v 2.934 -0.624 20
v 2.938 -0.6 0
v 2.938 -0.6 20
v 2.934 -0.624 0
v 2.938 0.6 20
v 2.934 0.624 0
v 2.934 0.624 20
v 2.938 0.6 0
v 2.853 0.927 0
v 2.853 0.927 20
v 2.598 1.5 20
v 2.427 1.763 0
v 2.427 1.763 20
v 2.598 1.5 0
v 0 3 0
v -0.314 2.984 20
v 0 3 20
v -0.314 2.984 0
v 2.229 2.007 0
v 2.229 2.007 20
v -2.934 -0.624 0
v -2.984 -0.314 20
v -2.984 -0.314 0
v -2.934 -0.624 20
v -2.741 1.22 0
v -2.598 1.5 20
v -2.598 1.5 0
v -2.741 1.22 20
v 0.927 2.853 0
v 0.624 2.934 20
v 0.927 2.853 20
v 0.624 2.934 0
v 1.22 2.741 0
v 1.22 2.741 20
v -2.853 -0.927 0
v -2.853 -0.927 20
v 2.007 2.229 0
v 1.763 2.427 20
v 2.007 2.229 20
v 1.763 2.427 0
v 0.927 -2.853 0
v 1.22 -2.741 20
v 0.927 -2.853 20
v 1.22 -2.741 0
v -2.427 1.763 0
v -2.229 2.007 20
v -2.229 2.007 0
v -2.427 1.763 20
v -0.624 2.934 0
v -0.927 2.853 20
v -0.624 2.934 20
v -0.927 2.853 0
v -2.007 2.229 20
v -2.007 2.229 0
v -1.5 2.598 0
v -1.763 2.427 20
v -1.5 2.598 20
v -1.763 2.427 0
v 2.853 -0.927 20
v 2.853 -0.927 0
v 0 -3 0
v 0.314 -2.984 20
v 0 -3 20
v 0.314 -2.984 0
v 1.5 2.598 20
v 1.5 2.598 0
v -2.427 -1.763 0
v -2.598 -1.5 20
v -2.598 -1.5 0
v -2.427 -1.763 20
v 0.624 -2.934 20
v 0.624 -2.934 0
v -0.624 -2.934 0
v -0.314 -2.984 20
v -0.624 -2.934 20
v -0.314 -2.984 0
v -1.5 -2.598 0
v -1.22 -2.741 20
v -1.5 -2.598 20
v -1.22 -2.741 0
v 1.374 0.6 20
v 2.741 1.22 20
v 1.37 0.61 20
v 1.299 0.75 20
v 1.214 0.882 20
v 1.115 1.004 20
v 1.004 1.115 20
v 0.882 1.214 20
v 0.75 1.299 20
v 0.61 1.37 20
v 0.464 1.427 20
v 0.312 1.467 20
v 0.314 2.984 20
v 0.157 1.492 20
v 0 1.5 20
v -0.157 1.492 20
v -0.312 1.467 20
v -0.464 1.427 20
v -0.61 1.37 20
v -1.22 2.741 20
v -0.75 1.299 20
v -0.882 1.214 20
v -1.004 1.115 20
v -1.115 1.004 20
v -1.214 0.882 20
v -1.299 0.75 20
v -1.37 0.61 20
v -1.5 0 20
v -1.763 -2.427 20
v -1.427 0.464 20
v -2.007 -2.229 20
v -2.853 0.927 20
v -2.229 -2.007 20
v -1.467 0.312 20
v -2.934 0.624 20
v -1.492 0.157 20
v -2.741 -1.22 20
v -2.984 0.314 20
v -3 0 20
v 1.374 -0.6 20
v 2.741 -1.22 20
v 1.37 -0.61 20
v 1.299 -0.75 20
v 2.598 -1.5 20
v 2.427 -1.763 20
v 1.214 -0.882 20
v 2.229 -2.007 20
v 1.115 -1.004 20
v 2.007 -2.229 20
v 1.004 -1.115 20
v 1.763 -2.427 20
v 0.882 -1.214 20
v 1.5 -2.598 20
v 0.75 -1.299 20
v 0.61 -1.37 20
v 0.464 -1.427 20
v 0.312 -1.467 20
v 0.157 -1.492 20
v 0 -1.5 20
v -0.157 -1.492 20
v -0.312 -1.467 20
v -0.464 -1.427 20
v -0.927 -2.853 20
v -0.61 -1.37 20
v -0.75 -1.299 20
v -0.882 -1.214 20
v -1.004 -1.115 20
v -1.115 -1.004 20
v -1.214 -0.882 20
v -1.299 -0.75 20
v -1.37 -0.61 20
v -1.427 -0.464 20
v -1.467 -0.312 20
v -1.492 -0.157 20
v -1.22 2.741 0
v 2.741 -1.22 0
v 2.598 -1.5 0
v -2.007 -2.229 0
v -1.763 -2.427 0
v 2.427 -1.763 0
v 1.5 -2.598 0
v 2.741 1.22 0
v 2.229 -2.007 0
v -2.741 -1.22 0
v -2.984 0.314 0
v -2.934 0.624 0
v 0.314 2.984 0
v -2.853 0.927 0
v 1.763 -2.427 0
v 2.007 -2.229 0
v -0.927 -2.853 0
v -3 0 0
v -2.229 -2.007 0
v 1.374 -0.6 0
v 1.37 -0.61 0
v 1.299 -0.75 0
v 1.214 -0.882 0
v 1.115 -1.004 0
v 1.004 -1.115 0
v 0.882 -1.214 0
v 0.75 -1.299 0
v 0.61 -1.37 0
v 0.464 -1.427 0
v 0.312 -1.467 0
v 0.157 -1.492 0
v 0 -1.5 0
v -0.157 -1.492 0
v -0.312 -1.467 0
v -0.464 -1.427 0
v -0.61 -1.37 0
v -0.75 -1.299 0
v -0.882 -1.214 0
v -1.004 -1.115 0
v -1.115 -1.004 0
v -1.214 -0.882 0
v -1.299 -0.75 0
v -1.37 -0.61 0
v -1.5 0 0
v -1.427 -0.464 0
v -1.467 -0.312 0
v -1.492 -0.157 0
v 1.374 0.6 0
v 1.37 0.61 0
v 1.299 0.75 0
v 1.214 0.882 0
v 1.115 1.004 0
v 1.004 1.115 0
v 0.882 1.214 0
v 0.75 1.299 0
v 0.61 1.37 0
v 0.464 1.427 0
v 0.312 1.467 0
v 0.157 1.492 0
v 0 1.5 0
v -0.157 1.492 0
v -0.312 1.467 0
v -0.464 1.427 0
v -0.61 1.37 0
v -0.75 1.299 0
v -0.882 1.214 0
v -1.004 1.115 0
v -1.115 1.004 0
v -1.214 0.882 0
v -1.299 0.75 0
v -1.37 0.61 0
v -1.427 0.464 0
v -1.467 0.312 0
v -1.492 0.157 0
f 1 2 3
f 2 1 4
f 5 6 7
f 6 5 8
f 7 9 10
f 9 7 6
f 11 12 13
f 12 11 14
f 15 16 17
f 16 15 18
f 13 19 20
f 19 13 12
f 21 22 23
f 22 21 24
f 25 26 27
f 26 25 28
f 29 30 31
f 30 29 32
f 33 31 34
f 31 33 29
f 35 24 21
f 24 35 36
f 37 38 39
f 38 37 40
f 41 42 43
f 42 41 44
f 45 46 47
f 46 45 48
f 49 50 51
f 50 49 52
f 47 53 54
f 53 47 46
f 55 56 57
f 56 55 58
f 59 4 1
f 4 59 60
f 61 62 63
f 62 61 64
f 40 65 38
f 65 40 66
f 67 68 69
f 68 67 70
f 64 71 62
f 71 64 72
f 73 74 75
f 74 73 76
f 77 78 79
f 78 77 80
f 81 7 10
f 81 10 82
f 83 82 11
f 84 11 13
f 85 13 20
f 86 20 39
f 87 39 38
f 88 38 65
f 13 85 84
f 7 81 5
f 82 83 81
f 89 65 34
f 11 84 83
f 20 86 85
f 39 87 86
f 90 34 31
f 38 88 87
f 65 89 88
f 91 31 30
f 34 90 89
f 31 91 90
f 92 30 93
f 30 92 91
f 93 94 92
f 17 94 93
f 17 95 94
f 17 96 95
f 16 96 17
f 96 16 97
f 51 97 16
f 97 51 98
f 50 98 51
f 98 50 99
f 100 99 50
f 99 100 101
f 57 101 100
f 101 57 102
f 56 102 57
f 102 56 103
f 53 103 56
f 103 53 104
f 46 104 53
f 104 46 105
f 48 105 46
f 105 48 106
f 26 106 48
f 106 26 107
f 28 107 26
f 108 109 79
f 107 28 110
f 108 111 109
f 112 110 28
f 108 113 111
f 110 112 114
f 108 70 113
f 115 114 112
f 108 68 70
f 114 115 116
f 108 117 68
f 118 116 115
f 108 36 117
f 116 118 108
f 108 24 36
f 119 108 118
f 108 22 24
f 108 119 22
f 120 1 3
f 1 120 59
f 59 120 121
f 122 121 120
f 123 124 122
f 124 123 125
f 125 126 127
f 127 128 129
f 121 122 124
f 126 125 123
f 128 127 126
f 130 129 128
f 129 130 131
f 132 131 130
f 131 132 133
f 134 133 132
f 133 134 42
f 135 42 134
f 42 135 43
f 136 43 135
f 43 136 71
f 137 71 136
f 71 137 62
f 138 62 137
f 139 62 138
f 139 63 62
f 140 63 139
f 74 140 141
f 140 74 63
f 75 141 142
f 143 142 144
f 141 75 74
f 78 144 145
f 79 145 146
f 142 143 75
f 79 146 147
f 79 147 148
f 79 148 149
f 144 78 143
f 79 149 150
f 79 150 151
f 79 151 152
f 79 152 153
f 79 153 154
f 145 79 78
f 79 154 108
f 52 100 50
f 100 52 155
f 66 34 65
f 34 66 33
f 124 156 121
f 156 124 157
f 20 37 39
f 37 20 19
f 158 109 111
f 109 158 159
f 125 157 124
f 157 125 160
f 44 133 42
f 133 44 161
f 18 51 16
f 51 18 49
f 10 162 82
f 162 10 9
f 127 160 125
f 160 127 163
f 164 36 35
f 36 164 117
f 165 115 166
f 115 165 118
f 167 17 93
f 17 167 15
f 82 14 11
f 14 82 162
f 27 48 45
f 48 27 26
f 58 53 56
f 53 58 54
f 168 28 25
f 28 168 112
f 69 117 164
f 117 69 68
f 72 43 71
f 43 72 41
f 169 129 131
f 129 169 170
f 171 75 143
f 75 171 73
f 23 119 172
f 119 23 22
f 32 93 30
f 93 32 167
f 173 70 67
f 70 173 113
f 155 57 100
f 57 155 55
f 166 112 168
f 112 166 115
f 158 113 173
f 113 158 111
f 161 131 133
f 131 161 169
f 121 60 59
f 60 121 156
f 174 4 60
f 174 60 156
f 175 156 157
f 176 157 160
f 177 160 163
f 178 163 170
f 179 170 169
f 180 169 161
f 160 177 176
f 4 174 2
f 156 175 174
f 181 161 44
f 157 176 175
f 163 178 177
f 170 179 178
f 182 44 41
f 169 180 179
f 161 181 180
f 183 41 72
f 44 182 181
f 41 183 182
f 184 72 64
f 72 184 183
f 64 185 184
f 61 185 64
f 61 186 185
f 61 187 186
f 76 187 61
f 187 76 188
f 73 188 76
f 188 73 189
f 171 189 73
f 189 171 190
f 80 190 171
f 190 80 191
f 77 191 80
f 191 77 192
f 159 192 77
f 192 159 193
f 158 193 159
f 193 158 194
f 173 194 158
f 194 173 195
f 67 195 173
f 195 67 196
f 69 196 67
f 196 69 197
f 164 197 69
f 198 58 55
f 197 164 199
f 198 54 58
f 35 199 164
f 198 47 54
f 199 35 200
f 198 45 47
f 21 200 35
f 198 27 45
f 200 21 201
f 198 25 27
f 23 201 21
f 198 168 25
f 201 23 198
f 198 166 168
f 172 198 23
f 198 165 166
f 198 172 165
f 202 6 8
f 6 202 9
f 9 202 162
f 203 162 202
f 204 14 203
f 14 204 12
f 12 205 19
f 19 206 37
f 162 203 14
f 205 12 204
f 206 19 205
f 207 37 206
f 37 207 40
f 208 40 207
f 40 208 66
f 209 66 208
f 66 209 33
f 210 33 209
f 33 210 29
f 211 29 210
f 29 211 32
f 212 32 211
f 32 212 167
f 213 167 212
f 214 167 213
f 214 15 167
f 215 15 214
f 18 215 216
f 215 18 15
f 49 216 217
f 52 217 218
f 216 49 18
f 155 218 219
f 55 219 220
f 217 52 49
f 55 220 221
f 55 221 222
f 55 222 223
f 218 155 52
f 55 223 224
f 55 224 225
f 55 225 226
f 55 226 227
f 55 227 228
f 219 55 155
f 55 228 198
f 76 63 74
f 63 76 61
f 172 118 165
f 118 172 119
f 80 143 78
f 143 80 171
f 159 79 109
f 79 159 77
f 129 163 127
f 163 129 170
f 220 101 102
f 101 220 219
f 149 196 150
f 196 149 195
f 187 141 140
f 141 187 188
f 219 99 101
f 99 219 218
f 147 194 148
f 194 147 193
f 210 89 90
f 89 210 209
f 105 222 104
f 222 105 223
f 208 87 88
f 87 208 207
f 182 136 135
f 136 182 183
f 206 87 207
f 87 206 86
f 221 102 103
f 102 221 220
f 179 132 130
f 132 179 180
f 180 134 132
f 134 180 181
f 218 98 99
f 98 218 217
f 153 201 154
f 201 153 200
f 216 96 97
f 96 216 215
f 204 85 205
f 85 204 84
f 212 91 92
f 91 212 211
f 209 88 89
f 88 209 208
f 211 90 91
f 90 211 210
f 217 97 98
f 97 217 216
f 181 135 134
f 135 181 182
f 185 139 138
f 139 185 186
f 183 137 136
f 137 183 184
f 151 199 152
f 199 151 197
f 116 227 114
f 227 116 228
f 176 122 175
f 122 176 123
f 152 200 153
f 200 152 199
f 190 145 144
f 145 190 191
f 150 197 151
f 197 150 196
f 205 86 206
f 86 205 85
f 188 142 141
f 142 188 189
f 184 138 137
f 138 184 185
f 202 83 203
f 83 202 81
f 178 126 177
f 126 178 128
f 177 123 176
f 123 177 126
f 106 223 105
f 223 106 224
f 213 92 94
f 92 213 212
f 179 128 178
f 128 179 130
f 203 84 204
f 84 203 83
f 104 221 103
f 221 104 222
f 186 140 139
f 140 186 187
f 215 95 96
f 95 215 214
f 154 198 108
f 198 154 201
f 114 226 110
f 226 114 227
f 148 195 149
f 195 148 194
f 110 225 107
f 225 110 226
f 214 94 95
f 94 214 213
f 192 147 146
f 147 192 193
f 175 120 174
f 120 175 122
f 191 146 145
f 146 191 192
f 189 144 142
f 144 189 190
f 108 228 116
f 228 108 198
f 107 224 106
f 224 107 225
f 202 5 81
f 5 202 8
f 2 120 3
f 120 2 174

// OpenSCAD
// Slotted spring pin sleeve.
$fn = 60;
eps = 0.02;
inner_d = 3;
outer_d = 6;
length = 20;
slot_w = 1.2;
difference() {
    cylinder(d = outer_d, h = length);
    translate([0, 0, -eps]) cylinder(d = inner_d, h = length + 2 * eps);
    translate([0, -slot_w / 2, -eps]) cube([outer_d / 2 + eps, slot_w, length + 2 * eps]);
}
